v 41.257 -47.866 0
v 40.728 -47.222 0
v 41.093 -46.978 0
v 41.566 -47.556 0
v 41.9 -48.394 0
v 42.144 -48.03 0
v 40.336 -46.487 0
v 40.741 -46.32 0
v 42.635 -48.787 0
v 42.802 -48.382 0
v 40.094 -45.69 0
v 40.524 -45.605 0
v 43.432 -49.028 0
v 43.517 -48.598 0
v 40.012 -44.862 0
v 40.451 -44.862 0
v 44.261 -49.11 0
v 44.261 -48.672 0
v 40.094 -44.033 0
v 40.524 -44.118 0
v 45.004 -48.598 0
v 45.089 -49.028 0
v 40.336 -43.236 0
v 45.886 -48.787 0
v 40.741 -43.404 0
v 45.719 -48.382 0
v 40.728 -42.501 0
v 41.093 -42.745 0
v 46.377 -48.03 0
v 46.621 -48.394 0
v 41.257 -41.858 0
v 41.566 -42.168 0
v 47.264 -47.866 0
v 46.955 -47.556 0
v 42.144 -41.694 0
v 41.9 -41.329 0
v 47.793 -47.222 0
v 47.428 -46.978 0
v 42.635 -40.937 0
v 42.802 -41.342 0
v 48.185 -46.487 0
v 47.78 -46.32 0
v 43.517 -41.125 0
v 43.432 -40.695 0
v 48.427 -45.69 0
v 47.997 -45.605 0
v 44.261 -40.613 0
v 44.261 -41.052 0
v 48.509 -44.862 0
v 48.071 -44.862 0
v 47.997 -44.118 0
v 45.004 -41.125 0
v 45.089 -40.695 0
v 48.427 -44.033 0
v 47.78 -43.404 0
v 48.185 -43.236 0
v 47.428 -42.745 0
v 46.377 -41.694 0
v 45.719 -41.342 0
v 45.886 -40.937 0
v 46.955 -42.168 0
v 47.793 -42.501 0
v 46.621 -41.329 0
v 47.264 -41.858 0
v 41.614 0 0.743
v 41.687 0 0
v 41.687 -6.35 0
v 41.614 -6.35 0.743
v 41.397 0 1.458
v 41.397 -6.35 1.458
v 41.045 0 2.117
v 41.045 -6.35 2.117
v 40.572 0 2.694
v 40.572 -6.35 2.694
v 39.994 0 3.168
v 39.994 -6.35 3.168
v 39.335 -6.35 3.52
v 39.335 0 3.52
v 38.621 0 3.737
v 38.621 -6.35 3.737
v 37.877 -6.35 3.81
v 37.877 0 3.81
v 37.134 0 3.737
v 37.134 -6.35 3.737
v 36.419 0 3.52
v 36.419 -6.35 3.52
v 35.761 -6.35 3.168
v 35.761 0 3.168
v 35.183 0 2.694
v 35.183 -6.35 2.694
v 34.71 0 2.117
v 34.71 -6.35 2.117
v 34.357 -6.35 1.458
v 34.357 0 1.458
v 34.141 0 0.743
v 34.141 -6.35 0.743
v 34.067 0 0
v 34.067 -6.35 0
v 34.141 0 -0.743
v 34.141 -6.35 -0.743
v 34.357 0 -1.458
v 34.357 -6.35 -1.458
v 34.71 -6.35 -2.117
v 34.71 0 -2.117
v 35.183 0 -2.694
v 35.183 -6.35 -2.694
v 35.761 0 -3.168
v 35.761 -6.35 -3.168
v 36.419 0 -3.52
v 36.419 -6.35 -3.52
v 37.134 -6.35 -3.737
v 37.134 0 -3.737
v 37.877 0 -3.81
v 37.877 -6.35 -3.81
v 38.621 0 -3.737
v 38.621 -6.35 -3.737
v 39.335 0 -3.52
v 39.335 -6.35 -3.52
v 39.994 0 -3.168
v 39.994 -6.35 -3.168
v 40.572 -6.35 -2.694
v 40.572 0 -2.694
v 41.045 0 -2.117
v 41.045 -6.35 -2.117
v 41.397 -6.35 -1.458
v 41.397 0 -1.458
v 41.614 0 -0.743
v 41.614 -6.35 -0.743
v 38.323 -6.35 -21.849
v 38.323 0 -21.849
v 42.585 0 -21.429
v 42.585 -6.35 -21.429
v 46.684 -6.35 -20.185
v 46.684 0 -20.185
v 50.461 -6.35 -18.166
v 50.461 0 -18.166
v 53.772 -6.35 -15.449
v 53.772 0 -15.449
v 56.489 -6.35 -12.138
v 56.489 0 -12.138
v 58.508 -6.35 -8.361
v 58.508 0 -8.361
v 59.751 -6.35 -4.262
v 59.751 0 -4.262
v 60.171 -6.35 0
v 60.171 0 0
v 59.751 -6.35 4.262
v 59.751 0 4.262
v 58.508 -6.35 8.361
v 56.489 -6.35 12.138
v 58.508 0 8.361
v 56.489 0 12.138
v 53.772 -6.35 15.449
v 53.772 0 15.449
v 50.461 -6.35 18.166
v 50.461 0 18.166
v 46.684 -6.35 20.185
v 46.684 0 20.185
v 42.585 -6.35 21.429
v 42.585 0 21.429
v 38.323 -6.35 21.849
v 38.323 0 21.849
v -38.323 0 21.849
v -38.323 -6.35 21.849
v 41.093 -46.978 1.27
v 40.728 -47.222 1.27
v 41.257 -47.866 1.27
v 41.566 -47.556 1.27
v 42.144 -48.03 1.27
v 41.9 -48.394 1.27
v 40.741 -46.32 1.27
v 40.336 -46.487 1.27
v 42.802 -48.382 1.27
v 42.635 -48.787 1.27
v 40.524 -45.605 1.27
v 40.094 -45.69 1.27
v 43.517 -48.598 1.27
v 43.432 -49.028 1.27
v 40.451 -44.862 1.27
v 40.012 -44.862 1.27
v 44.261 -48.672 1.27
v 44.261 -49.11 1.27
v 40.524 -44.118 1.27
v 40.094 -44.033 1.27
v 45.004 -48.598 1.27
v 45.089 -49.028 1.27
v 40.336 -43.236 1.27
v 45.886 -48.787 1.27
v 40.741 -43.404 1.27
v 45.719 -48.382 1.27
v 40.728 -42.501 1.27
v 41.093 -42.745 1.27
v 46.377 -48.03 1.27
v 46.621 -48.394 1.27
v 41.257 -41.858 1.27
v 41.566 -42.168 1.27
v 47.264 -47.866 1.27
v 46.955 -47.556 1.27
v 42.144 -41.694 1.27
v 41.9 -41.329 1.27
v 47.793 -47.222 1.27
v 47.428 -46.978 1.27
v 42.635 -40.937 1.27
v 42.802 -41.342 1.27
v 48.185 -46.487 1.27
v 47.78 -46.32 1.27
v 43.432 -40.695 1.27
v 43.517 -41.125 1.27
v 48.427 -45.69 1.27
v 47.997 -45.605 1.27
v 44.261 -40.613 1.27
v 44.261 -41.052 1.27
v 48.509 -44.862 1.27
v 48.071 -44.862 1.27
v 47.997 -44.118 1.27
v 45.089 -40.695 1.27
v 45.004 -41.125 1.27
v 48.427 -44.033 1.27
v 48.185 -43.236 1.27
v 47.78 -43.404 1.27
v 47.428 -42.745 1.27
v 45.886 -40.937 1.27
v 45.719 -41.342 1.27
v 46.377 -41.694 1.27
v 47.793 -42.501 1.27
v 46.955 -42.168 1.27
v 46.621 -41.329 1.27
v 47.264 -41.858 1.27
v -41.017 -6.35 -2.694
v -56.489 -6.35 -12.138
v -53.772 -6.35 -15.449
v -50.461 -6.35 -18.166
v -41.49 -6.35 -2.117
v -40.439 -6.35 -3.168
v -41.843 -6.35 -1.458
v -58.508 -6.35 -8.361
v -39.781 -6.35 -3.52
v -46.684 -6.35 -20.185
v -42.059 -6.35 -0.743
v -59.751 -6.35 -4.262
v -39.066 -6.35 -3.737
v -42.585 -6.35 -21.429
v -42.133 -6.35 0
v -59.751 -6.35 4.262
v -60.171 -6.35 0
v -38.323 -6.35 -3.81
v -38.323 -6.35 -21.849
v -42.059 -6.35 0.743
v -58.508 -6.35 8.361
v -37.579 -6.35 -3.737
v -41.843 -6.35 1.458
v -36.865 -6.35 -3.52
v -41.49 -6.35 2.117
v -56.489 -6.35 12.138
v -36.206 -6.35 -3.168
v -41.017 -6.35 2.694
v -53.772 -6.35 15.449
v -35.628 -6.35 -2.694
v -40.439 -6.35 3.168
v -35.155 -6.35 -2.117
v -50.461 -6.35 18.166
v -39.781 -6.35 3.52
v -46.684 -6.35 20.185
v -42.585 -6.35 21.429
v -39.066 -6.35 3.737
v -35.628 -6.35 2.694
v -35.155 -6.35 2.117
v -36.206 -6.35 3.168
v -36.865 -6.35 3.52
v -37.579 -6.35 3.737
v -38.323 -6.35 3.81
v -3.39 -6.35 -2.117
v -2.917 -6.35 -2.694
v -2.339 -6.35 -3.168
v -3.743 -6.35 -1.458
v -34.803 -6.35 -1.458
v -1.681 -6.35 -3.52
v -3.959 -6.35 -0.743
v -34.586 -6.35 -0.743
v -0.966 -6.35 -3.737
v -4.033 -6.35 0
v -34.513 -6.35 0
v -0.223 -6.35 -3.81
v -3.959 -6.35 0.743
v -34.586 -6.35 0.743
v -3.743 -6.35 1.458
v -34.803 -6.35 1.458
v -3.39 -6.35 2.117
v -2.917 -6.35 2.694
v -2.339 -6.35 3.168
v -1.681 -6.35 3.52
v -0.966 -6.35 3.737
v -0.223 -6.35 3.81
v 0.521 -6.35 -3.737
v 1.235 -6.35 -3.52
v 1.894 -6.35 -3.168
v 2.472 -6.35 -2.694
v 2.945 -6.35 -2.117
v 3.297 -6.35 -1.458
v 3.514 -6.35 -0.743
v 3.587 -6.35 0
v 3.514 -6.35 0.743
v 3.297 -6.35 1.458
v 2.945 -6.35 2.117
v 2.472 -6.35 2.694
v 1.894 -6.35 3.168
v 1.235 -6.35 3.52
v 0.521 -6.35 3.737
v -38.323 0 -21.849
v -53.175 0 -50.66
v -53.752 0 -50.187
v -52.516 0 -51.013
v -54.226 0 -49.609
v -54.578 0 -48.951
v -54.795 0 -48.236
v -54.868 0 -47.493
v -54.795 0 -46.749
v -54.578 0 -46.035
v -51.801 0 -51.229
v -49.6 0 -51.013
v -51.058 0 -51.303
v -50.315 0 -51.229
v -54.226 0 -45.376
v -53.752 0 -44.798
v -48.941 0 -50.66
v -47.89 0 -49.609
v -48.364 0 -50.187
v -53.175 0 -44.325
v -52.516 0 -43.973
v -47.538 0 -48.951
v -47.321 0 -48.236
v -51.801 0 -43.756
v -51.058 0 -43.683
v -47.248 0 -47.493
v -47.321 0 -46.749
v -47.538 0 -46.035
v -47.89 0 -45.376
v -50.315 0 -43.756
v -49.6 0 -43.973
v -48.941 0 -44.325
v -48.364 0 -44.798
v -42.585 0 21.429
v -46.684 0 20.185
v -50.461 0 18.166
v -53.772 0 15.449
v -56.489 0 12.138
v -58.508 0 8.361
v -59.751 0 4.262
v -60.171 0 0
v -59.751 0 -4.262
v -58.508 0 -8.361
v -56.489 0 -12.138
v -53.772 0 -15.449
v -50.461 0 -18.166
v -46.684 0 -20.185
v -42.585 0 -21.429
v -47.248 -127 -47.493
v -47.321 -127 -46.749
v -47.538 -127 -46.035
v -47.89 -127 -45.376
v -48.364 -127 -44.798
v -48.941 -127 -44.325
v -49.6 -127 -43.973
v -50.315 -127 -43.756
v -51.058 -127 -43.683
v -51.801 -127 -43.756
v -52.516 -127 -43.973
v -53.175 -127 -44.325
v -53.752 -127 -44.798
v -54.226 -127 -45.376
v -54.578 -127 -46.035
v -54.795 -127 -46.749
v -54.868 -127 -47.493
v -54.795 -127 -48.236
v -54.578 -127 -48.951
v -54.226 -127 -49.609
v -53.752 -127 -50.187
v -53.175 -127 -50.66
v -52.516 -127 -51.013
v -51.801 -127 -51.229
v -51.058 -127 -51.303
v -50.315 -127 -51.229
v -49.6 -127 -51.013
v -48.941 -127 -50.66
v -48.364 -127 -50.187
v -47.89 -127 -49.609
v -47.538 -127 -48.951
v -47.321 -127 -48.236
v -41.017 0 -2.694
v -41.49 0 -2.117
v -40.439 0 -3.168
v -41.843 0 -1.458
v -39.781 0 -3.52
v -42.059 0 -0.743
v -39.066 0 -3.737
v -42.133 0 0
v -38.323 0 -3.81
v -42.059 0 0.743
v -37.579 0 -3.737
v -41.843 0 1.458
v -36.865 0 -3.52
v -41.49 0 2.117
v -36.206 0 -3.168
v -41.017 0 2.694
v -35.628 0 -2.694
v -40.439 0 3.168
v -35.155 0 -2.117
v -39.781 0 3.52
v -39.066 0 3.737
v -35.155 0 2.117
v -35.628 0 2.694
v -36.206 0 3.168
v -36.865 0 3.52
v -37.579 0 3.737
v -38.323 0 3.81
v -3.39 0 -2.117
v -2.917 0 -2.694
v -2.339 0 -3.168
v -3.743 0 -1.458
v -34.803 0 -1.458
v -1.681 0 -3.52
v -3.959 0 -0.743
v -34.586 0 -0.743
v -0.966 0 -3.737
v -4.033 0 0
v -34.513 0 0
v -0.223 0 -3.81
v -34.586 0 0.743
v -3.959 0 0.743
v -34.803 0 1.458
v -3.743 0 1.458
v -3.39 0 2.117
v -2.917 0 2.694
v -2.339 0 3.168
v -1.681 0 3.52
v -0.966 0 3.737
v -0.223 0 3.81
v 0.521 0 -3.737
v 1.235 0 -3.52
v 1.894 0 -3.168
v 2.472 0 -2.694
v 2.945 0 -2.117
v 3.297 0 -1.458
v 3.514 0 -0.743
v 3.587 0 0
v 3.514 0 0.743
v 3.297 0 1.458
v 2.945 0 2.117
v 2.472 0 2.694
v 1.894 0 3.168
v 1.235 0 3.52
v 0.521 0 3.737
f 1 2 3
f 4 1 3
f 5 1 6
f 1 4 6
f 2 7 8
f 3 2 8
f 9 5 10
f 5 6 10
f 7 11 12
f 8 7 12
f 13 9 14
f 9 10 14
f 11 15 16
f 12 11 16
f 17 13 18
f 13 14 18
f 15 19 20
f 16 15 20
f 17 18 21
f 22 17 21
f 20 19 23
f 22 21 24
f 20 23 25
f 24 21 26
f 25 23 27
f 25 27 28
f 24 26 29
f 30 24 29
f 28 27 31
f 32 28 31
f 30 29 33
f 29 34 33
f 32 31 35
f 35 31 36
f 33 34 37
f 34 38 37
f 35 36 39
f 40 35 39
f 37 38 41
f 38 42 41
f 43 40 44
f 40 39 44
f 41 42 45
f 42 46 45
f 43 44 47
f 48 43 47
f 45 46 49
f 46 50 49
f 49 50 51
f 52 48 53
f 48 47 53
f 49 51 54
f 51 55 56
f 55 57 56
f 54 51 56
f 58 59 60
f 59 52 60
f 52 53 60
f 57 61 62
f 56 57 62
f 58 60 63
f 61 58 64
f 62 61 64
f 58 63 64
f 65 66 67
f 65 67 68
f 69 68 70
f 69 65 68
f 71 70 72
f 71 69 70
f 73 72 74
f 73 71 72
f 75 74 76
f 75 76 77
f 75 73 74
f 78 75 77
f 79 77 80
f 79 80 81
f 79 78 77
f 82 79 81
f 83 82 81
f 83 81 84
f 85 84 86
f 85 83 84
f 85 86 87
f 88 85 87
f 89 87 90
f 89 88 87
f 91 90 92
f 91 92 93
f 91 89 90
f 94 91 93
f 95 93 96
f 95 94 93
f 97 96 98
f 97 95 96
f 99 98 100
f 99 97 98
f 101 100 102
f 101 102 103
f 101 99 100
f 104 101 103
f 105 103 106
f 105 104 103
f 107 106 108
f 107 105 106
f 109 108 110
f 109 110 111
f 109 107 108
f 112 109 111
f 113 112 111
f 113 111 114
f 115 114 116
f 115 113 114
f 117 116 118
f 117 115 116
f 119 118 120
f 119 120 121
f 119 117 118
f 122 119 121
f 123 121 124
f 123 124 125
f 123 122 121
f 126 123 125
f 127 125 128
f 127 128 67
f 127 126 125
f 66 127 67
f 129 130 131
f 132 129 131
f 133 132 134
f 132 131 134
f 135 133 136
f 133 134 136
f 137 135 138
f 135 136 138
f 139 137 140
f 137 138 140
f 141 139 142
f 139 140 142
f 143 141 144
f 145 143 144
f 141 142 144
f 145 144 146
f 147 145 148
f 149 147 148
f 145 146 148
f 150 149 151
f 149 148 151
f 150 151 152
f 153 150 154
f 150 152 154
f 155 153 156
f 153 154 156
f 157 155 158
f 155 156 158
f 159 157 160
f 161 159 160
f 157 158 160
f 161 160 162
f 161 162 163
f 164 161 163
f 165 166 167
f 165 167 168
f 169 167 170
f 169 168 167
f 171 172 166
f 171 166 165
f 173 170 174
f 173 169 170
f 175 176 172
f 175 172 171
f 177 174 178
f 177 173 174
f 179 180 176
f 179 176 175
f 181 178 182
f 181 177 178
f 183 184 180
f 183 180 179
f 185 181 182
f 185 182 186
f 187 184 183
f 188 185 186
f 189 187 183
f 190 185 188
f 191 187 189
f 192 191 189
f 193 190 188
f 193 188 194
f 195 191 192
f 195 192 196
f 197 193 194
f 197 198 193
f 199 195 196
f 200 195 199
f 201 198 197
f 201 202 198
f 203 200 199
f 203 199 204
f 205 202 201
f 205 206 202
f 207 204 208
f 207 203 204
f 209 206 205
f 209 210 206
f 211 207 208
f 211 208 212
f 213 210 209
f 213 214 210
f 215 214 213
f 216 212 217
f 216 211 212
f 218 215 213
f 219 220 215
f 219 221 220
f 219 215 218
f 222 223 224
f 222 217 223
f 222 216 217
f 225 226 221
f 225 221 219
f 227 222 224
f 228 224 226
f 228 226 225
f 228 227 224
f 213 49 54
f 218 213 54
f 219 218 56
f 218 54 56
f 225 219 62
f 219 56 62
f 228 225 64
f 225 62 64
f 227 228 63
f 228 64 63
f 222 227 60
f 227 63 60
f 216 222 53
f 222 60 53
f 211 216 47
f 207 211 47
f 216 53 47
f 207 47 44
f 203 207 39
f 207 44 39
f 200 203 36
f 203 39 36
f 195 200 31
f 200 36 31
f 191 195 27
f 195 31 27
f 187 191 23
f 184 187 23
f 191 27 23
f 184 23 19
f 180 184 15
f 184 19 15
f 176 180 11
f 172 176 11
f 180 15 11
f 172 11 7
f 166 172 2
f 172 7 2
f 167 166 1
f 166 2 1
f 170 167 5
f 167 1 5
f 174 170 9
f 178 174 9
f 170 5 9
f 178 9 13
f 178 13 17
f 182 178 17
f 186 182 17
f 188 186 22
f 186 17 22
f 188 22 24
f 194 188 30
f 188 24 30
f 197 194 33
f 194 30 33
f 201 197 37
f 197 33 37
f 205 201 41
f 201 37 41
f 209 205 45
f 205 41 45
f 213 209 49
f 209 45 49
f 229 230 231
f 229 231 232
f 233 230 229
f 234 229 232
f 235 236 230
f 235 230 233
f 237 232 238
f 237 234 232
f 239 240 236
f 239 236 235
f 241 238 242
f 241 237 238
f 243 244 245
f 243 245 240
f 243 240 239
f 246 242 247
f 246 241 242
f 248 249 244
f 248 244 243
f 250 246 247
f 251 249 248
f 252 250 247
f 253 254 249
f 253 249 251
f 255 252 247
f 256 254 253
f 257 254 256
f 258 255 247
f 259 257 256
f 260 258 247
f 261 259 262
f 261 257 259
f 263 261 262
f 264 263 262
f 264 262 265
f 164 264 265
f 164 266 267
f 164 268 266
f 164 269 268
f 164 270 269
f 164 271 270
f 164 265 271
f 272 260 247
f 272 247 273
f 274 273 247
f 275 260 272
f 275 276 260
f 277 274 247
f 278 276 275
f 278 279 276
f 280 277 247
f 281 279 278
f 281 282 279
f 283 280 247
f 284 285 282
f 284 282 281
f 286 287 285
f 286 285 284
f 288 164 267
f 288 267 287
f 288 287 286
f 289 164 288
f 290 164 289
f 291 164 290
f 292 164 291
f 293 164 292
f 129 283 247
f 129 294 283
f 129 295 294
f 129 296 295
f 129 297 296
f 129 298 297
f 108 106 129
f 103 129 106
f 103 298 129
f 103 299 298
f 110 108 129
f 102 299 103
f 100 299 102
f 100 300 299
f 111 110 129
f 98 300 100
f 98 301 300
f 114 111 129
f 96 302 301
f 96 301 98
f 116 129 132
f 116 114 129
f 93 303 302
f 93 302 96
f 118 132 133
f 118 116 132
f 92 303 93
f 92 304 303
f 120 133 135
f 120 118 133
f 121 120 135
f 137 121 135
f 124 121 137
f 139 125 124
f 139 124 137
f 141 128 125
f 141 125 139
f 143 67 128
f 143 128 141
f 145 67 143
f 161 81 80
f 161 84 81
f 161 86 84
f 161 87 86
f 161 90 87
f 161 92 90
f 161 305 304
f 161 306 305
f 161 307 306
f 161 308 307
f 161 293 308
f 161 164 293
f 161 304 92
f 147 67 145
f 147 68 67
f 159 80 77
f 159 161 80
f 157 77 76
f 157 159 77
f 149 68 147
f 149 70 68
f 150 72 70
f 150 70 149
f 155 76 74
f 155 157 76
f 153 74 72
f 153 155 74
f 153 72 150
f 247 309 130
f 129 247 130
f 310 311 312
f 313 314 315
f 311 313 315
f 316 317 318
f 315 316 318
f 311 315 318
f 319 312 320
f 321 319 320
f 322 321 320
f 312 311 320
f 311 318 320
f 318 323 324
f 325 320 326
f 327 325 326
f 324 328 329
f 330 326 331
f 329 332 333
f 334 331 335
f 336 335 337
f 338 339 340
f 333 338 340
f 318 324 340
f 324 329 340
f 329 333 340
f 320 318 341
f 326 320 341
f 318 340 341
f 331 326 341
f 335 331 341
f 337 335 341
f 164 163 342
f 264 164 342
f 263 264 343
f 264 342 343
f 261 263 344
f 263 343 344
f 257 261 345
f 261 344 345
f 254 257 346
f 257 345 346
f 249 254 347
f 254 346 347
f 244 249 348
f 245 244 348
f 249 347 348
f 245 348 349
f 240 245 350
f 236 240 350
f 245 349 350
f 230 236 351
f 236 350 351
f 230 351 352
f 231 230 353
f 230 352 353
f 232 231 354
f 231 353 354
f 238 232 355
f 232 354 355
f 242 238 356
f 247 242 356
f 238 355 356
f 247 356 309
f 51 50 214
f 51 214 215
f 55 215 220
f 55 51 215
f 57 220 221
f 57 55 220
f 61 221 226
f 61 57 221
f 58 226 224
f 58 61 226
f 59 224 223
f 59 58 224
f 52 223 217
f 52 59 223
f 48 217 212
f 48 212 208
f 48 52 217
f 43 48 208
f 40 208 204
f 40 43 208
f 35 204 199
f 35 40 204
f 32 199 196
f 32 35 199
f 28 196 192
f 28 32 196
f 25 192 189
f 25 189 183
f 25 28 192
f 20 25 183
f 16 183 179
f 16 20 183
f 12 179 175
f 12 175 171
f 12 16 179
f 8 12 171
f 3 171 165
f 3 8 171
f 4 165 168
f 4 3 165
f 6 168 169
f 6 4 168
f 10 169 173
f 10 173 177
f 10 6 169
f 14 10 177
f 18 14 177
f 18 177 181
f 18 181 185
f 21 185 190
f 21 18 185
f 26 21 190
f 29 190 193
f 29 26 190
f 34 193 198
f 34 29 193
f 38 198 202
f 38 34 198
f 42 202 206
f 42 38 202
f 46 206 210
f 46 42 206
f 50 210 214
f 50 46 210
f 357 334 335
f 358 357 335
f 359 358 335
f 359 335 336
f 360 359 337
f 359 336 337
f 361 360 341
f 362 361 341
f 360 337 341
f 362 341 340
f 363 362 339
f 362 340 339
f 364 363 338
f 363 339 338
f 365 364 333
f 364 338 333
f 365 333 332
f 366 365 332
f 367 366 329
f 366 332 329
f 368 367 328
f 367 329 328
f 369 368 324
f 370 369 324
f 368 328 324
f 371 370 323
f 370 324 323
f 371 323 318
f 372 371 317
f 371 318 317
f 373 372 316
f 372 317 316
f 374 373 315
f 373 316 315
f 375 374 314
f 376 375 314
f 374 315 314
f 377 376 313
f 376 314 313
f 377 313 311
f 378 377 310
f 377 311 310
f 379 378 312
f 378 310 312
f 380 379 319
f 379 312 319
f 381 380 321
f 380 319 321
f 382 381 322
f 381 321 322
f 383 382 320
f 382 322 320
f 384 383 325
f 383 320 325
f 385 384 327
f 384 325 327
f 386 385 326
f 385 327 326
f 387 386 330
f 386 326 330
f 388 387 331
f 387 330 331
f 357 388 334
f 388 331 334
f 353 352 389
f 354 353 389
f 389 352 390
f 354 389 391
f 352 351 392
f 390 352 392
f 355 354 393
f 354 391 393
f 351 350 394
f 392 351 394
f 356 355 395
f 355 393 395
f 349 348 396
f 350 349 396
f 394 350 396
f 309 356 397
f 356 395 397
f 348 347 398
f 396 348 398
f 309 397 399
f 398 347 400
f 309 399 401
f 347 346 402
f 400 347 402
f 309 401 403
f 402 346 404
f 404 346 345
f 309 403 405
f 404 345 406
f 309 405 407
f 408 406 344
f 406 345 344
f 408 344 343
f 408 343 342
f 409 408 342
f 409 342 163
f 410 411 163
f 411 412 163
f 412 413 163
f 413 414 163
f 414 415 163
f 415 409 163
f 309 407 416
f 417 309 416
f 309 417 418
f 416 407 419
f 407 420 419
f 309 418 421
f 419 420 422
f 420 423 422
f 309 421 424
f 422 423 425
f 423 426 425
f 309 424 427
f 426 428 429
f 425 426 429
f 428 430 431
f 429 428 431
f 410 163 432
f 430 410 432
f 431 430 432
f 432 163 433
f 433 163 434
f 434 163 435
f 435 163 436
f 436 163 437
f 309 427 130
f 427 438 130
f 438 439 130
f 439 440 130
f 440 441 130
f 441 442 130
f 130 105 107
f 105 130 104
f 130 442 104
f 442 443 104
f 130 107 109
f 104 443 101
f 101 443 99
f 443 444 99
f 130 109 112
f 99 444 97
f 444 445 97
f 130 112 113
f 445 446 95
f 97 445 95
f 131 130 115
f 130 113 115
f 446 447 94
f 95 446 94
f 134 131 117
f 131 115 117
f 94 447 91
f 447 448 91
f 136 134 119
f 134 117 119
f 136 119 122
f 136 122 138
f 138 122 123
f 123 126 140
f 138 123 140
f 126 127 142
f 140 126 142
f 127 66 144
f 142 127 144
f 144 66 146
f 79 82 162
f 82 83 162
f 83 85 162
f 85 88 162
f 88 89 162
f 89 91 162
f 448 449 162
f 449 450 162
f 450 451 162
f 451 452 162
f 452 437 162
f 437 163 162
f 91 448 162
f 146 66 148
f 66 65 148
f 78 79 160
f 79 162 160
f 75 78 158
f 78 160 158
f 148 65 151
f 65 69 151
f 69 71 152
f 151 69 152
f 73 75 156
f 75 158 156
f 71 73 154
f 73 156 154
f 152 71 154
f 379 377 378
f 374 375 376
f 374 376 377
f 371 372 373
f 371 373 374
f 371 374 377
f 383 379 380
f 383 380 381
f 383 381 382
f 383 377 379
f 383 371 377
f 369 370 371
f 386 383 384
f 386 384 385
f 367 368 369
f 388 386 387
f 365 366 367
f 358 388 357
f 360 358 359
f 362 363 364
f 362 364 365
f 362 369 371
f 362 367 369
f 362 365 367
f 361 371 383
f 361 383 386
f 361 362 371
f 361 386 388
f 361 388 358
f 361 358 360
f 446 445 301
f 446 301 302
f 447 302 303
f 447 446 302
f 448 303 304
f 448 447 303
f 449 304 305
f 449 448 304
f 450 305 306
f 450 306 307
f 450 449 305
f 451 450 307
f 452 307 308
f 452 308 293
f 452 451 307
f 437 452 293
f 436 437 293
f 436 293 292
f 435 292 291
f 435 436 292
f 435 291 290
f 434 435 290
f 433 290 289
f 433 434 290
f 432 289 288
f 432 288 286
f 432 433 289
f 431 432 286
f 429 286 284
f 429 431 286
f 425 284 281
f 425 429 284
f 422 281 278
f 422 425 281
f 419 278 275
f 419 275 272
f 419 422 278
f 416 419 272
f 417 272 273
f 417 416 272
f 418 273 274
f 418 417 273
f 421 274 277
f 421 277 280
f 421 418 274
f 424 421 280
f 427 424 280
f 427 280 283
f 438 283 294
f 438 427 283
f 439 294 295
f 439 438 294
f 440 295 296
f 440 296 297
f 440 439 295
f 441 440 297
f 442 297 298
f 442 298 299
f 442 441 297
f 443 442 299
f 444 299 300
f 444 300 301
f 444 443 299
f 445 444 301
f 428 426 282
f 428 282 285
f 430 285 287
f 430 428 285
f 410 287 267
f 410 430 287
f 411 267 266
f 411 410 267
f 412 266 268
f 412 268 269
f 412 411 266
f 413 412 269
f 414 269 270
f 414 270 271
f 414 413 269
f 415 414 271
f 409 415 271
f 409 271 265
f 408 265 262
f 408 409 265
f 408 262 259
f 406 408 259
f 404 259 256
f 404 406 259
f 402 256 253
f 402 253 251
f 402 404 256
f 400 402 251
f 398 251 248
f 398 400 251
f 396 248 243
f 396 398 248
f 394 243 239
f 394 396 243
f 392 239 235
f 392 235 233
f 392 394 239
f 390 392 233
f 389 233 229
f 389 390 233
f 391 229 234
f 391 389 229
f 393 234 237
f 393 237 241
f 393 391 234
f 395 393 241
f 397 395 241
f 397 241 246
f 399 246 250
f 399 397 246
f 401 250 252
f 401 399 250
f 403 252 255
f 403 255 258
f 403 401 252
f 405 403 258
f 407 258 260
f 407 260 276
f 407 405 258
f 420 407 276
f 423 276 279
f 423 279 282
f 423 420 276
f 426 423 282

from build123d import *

# Parameters (mm, degrees)
F0_R      = 3.81
F1_DEPTH  = 6.35
F2_R      = 3.81
F3_DEPTH  = 127
F12_R     = 4.248258
F12_R_2   = 3.81
F13_DEPTH = 1.27


with BuildPart() as f1:
    # F0 (on Front) → F1 (new body)
    with BuildSketch(Plane.XZ):
        with BuildLine():
            Line((-38.322541, -21.848525), (38.322541, -21.848525))
            ThreePointArc((38.322541, -21.848525), (60.171066, 0), (38.322541, 21.848525))
            Line((38.322541, 21.848525), (-38.322541, 21.848525))
            ThreePointArc((-38.322541, 21.848525), (-60.171066, 0), (-38.322541, -21.848525))
        make_face()
        with Locations((-38.322541, 0)):
            Circle(F0_R, mode=Mode.SUBTRACT)
        with Locations((-0.222541, 0)):
            Circle(F0_R, mode=Mode.SUBTRACT)
        with Locations((37.877459, 0)):
            Circle(F0_R, mode=Mode.SUBTRACT)
    extrude(amount=F1_DEPTH)


with BuildPart() as f3:
    # F2 (on Front) → F3 (new body)
    with BuildSketch(Plane.XZ):
        with Locations((-51.05808, -47.492567)):
            Circle(F2_R)
    extrude(amount=F3_DEPTH)


with BuildPart() as f4_1:
    # F4: copy of F3
    add(f3.part)


with BuildPart() as f6_1:
    # F6: copy of F3
    add(f3.part)


with BuildPart() as f8_1:
    # F8: copy of F3
    add(f3.part.moved(Location((50.16212, 0, 0))))


with BuildPart() as f9_1:
    # F9: copy of F8_1
    add(f8_1.part.moved(Location((42.6117, 0, 0))))


with BuildPart() as f13:
    # F12 (on Top) → F13 (new body)
    with BuildSketch(Plane.XY):
        with Locations((44.260517, -44.861678)):
            Circle(F12_R)
        with Locations((44.260517, -44.861678)):
            Circle(F12_R_2, mode=Mode.SUBTRACT)
    extrude(amount=F13_DEPTH)


solid = Compound([f1.part, f3.part, f13.part])
